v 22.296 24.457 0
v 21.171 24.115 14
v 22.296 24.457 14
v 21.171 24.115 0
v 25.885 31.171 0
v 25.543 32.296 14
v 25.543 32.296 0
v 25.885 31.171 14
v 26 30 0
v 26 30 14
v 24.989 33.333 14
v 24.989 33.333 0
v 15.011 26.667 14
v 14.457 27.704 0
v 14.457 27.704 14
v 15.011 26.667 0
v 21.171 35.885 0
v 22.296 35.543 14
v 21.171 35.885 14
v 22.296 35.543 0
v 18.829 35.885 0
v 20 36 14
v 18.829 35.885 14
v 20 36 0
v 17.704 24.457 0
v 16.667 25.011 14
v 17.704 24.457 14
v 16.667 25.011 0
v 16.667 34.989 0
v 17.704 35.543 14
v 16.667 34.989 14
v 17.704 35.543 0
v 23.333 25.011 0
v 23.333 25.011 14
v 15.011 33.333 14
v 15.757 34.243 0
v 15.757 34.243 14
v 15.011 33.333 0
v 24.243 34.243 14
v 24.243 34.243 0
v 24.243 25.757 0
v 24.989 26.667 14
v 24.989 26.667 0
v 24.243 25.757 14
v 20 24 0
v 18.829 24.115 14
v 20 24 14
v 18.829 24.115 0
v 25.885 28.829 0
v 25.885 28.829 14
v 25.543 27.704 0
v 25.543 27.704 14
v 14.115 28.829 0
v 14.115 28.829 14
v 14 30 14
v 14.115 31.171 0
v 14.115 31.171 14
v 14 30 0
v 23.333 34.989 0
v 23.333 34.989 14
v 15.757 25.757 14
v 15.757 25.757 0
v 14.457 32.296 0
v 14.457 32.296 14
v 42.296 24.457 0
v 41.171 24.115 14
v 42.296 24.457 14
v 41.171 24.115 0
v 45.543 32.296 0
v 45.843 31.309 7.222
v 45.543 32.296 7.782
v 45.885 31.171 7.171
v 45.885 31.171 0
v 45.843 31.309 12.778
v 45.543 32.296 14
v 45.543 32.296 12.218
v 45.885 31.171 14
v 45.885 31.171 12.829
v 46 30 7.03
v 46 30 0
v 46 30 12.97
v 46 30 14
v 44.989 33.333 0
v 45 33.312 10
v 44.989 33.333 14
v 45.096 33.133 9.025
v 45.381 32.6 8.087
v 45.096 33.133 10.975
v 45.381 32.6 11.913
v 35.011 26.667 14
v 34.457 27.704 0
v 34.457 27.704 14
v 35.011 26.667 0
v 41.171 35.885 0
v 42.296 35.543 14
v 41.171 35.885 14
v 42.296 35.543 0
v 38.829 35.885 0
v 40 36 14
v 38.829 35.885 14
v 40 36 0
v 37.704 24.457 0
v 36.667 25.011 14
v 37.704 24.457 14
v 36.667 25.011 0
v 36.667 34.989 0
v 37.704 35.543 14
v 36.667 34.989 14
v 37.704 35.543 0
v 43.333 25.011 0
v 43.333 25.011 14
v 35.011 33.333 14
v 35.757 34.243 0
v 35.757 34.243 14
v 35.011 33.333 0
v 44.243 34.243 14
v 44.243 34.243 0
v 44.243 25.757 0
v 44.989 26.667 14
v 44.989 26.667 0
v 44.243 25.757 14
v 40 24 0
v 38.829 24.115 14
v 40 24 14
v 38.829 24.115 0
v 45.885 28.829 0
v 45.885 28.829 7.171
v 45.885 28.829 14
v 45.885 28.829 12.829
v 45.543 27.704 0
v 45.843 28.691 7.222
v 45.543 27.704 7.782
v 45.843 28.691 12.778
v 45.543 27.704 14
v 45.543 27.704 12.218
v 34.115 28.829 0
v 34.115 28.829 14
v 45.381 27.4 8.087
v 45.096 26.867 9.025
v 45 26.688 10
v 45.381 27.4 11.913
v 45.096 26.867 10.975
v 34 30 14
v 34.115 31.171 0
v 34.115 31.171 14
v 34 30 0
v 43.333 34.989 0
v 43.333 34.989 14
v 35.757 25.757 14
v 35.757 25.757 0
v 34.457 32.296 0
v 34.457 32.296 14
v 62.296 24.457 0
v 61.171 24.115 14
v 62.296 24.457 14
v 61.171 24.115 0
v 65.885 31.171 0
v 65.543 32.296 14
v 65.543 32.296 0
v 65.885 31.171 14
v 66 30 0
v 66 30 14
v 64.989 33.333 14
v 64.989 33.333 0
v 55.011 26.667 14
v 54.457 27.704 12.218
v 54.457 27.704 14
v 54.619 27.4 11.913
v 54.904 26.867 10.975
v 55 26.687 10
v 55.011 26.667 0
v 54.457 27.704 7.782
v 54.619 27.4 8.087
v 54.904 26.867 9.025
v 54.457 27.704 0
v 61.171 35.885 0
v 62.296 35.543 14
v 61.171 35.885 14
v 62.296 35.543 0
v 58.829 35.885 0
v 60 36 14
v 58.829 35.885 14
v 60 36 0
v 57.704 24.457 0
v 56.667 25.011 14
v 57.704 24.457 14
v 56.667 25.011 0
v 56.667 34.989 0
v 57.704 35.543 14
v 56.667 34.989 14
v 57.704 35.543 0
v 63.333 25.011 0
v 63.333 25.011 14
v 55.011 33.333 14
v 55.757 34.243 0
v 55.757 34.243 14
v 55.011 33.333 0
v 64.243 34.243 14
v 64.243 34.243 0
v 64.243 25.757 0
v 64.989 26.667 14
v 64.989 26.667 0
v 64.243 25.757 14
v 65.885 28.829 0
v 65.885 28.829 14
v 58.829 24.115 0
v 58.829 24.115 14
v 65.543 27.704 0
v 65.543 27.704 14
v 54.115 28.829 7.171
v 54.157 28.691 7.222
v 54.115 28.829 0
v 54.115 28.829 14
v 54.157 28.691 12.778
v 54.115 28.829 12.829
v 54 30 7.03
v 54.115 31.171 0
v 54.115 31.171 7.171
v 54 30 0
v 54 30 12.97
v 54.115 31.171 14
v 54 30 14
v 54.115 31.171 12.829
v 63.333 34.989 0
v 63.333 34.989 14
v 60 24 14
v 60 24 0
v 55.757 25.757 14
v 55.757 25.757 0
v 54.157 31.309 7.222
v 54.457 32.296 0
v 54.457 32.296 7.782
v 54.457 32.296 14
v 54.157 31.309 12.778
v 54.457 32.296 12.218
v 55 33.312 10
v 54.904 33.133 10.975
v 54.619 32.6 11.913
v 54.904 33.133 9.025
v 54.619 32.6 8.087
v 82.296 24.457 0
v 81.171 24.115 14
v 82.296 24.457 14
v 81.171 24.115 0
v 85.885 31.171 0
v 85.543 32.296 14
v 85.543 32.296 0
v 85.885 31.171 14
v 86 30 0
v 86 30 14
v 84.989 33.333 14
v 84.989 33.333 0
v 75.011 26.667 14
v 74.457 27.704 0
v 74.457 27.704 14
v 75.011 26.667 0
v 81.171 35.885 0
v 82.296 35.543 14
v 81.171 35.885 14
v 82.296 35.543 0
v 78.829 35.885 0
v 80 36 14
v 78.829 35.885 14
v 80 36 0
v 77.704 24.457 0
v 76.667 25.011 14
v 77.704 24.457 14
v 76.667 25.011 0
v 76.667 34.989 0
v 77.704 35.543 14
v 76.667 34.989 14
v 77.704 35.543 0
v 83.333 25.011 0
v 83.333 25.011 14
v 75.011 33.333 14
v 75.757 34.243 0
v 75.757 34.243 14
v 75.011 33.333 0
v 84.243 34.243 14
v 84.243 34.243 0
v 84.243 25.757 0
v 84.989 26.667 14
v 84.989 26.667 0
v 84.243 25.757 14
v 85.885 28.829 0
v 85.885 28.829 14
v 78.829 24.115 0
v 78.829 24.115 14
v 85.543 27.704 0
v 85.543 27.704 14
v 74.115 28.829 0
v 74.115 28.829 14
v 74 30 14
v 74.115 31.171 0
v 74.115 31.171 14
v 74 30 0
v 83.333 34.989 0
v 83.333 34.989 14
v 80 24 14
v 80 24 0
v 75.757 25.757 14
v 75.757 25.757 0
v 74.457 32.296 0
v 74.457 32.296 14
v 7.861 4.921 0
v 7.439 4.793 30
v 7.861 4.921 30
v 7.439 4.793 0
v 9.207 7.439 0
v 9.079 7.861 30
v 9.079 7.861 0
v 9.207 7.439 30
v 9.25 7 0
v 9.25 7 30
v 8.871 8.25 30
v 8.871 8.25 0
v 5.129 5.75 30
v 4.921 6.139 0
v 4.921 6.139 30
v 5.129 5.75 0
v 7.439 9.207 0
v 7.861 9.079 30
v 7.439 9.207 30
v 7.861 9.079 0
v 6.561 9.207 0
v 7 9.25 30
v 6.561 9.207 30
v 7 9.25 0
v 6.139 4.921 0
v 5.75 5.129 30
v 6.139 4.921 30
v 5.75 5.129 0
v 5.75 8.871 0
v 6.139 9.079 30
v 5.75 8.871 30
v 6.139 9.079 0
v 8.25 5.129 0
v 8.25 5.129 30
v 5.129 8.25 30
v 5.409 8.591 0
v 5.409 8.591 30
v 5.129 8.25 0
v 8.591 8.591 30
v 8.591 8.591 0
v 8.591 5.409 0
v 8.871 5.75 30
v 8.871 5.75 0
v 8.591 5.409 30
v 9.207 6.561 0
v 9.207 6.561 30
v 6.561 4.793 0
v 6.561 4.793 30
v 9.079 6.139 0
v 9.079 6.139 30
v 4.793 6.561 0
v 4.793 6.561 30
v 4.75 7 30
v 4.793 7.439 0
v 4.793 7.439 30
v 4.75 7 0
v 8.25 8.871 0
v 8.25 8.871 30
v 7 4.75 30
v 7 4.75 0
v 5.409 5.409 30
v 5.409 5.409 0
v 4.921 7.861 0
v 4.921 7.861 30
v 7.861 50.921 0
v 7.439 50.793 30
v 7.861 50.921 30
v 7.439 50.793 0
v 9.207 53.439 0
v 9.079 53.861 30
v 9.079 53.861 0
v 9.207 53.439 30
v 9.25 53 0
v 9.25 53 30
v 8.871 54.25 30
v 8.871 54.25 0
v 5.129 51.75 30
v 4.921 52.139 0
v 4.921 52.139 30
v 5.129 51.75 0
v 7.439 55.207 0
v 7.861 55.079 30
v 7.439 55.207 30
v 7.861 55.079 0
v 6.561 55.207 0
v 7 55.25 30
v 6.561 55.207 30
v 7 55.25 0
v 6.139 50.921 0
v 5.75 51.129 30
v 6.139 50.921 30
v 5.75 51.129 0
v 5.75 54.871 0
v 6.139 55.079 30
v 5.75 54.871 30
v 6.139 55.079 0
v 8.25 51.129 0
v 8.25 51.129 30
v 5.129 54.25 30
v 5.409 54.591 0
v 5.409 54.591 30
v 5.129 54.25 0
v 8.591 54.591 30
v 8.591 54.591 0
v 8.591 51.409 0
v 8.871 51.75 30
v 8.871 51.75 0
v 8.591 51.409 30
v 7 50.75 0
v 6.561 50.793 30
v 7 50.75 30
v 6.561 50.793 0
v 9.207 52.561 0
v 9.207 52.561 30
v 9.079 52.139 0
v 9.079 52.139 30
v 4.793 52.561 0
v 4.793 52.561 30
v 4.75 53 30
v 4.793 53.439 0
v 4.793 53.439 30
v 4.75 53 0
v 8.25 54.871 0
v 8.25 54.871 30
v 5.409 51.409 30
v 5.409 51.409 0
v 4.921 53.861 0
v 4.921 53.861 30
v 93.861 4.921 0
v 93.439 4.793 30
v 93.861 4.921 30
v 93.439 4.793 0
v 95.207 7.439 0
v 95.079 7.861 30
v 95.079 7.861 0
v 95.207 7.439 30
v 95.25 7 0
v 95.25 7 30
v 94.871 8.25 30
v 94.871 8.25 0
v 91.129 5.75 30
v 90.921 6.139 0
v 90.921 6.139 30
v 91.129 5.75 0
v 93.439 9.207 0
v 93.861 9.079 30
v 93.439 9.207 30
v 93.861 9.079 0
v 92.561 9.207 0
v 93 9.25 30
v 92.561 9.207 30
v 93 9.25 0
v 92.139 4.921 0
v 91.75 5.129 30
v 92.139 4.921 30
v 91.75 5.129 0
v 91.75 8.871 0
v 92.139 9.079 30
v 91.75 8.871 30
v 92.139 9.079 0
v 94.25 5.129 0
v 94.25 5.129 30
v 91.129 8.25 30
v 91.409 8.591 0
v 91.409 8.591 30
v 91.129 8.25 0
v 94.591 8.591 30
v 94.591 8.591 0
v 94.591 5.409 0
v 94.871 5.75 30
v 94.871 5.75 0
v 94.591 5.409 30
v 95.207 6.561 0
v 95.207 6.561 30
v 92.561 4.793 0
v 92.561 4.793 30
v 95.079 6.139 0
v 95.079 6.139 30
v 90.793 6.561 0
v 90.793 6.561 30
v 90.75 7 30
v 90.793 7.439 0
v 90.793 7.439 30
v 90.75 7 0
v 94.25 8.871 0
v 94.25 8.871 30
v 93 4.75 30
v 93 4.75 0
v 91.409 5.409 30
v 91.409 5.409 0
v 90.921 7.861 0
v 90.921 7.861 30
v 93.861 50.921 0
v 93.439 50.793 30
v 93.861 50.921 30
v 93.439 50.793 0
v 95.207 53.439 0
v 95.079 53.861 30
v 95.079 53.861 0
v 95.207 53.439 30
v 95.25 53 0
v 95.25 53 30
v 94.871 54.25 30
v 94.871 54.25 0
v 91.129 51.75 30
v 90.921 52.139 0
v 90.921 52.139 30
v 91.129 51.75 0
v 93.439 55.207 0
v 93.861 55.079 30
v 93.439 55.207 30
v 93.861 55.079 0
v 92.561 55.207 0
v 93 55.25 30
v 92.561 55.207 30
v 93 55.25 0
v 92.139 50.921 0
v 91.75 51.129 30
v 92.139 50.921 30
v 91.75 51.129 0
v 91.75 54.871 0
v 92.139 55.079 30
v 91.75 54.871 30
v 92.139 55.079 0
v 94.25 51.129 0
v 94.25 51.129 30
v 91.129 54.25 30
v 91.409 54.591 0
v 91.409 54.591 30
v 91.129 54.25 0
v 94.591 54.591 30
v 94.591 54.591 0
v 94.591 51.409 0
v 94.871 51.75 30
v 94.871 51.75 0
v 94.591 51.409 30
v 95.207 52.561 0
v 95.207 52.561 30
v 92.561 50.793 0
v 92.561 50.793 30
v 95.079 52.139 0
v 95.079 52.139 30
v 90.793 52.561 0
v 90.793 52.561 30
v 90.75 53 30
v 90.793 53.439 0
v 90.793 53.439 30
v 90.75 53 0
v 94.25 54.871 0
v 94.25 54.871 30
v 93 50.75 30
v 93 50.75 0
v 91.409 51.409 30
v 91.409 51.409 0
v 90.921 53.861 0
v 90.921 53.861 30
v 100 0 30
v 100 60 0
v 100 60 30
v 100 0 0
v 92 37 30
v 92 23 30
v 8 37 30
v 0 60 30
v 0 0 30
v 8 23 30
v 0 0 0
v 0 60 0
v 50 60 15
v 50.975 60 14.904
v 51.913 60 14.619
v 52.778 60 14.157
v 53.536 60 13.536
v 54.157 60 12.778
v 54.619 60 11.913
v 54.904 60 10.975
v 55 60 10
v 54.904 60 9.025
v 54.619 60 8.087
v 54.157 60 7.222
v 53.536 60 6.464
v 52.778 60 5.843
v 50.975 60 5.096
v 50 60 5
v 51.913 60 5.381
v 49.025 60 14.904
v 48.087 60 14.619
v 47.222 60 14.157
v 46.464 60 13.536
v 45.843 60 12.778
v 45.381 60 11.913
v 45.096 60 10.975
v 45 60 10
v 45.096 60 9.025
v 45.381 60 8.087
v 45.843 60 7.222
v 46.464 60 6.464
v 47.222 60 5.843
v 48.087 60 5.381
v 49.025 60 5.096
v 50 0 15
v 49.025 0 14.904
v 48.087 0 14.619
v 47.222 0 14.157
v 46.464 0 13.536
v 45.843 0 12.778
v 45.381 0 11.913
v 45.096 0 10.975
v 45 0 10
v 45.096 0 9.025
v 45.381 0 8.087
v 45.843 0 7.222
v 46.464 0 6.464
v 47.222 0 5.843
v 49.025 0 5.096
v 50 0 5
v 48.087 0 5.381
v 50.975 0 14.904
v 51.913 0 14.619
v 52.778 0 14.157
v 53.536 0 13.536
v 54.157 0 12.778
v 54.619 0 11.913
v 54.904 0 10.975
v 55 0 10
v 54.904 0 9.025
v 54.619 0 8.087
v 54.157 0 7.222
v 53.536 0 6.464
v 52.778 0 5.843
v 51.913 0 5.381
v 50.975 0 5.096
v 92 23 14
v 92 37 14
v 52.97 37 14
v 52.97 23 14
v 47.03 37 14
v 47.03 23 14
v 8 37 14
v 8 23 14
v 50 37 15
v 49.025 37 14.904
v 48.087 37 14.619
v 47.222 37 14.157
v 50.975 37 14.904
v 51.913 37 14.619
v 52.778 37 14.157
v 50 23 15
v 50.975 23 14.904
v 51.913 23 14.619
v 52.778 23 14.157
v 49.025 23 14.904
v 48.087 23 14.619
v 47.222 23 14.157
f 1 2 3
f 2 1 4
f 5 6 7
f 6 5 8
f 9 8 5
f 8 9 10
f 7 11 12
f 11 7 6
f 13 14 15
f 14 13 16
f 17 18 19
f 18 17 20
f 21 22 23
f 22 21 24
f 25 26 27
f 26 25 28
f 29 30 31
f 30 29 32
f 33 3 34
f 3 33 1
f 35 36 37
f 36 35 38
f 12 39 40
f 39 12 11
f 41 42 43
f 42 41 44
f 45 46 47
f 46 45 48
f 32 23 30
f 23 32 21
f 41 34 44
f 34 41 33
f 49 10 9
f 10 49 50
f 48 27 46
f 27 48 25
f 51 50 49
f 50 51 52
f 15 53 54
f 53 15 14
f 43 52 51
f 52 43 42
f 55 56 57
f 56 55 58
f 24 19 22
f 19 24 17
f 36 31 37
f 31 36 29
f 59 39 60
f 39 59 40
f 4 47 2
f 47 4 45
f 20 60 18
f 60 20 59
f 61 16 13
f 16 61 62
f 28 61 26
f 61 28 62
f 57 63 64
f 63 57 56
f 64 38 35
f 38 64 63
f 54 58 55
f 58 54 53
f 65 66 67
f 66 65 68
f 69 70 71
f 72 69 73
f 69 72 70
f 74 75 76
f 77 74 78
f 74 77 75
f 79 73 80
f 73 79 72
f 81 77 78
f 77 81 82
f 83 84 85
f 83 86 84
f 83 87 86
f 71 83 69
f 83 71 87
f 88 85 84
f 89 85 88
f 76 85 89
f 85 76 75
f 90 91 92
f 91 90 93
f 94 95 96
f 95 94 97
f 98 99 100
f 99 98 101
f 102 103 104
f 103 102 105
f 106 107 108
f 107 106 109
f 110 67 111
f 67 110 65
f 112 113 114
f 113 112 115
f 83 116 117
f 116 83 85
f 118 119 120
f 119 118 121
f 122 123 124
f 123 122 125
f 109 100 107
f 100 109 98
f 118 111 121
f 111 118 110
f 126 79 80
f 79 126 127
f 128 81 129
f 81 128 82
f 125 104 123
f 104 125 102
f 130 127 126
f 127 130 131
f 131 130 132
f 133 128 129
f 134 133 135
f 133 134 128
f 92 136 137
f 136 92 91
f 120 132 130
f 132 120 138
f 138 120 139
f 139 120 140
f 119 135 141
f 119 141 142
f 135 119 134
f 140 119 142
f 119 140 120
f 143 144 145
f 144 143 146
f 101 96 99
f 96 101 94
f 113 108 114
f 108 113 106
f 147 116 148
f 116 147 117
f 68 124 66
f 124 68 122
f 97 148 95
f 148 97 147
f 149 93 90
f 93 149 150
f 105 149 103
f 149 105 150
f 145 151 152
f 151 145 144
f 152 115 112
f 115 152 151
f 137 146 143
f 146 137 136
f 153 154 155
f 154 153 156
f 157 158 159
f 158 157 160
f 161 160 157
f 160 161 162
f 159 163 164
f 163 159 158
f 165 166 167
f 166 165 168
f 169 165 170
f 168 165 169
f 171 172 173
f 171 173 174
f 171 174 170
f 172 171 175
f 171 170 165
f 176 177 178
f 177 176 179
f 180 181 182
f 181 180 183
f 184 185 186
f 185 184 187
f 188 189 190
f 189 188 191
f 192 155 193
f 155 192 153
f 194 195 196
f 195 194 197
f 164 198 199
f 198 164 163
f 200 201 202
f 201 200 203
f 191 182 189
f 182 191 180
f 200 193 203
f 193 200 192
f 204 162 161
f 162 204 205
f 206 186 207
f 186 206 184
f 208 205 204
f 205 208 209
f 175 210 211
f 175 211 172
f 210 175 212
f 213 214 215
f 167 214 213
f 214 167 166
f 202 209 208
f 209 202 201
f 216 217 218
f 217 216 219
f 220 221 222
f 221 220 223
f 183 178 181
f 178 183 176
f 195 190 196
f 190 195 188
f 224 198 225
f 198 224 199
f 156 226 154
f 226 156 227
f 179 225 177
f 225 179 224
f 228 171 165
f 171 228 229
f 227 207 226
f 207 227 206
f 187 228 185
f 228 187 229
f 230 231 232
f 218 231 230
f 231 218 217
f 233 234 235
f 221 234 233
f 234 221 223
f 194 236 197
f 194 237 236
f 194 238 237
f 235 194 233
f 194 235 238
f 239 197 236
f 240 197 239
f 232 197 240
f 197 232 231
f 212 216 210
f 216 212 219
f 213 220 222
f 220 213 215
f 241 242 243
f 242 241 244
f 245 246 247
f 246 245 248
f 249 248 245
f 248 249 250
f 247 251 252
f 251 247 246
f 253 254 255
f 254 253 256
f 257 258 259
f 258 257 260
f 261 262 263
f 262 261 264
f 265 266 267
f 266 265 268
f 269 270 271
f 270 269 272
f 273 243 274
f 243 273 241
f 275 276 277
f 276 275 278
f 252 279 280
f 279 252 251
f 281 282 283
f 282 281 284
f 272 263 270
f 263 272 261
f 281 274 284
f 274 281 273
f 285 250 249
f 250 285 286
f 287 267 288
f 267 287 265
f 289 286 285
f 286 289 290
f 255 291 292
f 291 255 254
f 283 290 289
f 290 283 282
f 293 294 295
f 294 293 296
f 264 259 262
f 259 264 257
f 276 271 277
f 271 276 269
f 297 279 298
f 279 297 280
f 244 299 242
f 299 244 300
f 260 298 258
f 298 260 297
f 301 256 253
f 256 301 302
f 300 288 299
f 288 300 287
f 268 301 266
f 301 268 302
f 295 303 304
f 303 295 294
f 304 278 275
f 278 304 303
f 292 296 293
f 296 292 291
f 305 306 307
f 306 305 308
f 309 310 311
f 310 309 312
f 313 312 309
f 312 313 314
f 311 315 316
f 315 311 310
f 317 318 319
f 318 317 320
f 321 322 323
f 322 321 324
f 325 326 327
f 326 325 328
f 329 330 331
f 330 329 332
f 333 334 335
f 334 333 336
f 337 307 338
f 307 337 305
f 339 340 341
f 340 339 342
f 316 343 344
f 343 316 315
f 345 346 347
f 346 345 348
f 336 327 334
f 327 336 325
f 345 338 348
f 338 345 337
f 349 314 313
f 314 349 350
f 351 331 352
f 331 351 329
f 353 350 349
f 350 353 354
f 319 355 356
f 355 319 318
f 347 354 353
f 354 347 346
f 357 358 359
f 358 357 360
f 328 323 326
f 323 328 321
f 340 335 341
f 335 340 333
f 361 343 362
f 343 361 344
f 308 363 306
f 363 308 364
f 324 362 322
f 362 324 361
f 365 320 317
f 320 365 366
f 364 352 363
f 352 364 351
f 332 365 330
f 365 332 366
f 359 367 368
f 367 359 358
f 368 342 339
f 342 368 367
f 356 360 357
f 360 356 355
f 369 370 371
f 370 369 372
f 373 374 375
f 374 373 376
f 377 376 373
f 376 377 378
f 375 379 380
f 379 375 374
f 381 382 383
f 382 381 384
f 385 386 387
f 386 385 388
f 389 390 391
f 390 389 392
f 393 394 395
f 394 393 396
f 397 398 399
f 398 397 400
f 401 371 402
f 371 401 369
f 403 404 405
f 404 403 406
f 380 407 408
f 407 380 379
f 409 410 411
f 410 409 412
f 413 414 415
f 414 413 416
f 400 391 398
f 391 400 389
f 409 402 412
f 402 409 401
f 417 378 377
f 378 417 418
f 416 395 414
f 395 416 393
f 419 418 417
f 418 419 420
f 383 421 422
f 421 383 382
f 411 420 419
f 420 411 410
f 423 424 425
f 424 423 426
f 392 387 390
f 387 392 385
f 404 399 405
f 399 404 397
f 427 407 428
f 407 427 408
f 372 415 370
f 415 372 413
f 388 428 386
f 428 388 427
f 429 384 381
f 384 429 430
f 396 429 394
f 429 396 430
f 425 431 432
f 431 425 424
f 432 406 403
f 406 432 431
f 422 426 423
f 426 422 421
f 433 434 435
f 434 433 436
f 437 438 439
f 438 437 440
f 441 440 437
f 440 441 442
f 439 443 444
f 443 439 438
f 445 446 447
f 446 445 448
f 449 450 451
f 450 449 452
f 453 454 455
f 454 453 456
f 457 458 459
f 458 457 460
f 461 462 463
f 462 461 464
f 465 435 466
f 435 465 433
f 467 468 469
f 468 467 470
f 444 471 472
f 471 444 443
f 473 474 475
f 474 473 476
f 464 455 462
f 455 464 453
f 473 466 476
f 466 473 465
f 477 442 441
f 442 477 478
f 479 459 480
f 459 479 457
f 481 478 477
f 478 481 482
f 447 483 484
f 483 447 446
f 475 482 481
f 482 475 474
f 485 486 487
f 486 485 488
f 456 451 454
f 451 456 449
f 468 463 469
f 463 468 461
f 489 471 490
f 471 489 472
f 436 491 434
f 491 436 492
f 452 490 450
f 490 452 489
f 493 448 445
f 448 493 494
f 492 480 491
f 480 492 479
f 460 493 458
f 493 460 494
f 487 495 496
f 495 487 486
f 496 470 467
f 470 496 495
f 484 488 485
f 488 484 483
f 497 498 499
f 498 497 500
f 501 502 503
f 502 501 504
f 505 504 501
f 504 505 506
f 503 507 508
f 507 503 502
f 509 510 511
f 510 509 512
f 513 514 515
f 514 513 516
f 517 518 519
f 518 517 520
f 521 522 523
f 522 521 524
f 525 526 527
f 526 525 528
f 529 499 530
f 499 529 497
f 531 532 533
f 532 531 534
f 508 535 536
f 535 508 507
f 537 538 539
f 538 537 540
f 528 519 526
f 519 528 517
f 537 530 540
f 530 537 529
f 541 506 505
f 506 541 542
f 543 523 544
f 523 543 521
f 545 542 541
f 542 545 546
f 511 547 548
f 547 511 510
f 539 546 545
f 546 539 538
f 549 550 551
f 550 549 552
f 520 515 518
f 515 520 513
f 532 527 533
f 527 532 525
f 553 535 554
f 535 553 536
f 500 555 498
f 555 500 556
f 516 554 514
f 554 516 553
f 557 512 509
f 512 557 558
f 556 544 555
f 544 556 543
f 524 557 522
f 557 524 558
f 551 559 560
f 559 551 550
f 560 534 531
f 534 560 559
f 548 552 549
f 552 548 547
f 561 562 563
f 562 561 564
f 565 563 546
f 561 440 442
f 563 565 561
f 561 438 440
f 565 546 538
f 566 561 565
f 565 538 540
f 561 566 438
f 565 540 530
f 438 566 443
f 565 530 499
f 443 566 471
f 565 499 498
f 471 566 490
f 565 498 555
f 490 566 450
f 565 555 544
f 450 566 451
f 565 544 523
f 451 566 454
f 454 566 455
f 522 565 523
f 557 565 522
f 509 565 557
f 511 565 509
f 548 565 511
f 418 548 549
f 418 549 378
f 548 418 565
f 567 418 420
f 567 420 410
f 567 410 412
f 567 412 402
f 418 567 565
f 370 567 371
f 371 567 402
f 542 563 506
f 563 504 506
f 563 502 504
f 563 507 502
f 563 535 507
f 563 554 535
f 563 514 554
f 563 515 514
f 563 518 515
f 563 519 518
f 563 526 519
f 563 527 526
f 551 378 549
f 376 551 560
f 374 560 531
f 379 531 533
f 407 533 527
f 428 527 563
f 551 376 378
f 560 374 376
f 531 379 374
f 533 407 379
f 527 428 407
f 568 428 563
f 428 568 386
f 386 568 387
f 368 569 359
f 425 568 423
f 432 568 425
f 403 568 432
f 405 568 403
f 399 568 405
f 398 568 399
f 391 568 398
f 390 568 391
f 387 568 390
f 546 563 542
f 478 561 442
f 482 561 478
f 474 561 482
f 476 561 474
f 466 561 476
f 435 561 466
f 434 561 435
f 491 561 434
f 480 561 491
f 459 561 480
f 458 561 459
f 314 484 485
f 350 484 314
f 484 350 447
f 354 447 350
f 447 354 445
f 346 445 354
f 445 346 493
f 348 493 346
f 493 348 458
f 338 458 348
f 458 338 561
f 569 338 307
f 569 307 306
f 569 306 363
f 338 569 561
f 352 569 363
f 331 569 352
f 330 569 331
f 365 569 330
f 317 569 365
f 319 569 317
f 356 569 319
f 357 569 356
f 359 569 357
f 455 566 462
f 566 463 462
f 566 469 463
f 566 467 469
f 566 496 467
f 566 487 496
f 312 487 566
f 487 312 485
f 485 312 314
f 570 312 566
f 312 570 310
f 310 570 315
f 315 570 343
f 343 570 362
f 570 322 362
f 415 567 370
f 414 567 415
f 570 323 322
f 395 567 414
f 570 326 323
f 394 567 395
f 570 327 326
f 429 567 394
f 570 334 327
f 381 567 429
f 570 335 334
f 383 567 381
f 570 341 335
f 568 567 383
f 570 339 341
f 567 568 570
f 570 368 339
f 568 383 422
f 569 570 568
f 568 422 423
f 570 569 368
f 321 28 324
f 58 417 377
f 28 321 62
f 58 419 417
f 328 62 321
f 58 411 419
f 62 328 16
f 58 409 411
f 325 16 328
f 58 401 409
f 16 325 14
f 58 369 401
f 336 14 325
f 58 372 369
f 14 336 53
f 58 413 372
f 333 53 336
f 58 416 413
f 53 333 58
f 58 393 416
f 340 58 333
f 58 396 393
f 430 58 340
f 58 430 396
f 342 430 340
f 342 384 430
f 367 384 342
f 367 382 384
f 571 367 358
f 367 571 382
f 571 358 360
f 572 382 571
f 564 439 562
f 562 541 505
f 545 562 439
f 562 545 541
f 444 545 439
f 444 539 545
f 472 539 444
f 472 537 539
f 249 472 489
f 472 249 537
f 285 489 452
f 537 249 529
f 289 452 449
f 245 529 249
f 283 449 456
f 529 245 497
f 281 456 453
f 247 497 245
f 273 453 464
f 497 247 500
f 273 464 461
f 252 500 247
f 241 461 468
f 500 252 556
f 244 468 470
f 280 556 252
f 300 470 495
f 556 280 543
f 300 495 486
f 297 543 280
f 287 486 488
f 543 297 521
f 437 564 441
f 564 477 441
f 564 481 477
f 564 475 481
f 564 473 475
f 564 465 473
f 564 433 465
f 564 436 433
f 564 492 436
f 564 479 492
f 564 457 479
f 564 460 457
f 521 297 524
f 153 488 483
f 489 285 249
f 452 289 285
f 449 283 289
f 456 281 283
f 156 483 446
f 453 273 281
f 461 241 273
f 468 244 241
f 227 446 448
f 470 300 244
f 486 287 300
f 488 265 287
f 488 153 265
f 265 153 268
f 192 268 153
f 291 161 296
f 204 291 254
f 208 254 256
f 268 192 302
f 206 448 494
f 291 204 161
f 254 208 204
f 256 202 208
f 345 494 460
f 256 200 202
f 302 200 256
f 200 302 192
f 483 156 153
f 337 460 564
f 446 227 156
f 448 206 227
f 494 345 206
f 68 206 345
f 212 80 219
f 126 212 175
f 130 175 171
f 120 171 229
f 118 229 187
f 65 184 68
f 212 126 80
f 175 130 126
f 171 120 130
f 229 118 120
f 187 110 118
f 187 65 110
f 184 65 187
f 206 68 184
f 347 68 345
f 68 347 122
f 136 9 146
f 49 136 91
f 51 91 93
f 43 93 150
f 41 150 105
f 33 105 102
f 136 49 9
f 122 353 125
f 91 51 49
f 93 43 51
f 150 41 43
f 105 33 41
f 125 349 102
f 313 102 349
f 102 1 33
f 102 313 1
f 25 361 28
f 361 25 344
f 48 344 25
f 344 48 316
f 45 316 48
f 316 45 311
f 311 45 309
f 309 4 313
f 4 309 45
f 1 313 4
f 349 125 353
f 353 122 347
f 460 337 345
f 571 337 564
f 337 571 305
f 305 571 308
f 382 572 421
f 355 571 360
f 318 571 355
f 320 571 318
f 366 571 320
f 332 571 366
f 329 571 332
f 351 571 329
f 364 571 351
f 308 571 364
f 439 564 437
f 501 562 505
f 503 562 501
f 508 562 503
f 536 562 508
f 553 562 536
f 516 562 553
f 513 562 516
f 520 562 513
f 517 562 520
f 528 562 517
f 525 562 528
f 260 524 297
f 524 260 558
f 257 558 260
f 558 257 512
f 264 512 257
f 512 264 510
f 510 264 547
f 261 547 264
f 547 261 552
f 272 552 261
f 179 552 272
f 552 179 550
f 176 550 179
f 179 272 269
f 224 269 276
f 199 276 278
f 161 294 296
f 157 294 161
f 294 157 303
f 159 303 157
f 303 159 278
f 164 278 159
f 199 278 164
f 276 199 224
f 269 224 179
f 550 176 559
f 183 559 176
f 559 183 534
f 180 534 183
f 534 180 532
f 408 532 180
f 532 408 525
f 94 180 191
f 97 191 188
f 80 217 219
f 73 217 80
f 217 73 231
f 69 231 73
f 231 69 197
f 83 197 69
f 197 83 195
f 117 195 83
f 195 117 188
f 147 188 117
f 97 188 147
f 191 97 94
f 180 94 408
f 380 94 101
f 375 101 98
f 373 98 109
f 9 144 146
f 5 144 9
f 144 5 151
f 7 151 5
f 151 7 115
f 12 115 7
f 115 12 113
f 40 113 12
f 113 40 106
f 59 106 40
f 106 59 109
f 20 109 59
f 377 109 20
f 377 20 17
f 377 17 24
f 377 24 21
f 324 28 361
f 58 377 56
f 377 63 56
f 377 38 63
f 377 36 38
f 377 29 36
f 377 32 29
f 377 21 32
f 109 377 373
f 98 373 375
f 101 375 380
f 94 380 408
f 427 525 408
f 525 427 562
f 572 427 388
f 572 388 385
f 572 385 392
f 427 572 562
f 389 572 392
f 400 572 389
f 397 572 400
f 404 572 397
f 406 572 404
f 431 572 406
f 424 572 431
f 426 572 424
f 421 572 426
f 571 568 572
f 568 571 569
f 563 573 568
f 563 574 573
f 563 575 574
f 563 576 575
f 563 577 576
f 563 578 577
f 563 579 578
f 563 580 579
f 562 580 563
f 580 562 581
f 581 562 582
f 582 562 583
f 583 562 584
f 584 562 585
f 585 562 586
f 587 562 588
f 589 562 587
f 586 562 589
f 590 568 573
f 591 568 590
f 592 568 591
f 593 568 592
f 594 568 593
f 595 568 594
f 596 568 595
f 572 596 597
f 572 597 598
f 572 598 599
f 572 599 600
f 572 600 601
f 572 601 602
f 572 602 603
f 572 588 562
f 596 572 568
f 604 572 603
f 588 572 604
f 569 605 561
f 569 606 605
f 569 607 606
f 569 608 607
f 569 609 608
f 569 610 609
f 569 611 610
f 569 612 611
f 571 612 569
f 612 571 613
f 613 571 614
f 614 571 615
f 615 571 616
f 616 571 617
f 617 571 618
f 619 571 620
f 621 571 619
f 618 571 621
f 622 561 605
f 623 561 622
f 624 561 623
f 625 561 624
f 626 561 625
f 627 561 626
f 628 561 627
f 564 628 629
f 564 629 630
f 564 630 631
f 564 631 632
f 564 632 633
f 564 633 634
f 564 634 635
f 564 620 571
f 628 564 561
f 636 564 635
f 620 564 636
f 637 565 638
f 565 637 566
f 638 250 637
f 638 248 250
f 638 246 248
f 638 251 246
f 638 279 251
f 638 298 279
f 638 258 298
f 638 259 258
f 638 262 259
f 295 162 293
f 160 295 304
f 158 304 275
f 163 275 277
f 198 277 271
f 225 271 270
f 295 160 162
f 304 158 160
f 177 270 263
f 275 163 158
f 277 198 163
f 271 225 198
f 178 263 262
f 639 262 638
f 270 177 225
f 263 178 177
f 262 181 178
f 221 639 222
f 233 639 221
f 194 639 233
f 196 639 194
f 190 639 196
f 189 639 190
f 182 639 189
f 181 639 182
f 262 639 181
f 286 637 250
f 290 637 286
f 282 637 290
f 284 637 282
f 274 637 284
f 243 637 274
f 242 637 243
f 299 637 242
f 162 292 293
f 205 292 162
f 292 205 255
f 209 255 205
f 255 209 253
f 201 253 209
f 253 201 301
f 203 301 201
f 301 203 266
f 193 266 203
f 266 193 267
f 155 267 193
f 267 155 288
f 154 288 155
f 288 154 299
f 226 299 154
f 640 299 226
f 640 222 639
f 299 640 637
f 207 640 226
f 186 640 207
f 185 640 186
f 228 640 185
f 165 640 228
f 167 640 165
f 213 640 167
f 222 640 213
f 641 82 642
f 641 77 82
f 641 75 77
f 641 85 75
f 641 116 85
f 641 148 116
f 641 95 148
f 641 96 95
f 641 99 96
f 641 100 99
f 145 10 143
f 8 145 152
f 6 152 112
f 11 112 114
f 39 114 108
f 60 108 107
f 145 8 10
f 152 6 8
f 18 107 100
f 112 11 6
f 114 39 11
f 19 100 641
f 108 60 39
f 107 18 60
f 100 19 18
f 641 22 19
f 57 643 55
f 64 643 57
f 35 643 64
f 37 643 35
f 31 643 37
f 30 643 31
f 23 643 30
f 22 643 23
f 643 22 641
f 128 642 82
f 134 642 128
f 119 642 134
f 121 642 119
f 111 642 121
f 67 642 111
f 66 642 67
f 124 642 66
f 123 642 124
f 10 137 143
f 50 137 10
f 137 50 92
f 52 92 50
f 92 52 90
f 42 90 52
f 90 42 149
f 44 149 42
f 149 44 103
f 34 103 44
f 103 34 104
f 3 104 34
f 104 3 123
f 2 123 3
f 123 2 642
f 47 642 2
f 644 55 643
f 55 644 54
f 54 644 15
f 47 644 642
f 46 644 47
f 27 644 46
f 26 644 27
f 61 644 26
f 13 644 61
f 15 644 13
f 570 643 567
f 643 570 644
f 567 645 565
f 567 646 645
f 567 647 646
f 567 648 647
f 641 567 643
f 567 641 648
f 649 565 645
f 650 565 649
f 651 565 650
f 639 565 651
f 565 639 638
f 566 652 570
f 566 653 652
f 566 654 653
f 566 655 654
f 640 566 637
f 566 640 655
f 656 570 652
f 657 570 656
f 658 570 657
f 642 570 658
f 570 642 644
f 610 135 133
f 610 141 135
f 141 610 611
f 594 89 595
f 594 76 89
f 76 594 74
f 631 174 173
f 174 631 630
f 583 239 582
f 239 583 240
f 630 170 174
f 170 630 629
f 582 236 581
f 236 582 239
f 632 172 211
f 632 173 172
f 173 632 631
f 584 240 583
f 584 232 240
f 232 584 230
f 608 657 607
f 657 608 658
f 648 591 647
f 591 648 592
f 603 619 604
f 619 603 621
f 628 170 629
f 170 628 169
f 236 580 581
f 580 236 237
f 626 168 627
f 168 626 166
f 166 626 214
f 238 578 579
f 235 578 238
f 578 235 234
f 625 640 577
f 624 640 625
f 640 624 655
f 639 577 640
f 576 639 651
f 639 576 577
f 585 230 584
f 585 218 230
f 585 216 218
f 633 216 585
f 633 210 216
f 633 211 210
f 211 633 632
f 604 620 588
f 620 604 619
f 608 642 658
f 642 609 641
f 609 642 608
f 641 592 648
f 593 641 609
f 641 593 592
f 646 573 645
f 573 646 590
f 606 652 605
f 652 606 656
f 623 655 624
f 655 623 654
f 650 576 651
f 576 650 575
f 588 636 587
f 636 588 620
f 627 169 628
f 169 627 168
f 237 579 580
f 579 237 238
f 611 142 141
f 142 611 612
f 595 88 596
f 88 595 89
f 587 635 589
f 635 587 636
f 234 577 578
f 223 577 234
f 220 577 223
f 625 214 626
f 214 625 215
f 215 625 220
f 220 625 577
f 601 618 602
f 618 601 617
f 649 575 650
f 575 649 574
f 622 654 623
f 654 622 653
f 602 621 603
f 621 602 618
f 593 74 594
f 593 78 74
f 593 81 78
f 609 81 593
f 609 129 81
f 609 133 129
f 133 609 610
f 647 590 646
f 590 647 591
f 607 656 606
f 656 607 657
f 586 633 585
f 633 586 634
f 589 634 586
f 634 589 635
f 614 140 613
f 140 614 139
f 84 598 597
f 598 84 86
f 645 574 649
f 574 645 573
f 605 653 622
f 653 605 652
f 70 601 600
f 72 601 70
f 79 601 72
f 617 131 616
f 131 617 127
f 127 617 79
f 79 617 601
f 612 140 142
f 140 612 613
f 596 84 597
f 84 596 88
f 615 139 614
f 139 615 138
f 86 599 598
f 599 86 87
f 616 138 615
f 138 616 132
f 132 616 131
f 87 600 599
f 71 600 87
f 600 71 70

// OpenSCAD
$fn = 32;

// ----------------------------------------------------------------------
// Manifold block: side_outlet manifold
// ----------------------------------------------------------------------

// --- parameters (mm) ---
block_l = 100;            // block length, X
block_w = 60;             // block width, Y
block_h = 30;             // block height, Z
port_d = 12;              // port bore diameter
port_pitch = 20;          // port pitch along X
gallery_d = 14;           // top gallery width, Y
gallery_depth = 16;       // gallery pocket depth
wall_p = 8;               // gallery end wall thickness, X
mnt_d = 4.5;              // mounting hole diameter
mnt_in = 7;               // mounting hole inset from the edges
out_d = 10;               // outlet bore diameter
out_z = 10;               // outlet axis height

n_ports = 4;  // ports in the row
port_x0 = (block_l - (n_ports - 1) * port_pitch) / 2;  // first port X

difference() {
  cube([block_l, block_w, block_h]);
  for (i = [0 : n_ports - 1])
    translate([port_x0 + i * port_pitch, block_w / 2, -1])
      cylinder(h = block_h + 2, d = port_d);
  translate([wall_p, block_w / 2 - gallery_d / 2, block_h - gallery_depth])
    cube([block_l - 2 * wall_p, gallery_d, gallery_depth + 1]);
  for (cx = [mnt_in, block_l - mnt_in])
    for (cy = [mnt_in, block_w - mnt_in])
      translate([cx, cy, -1]) cylinder(h = block_h + 2, d = mnt_d);
  translate([block_l / 2, -1, out_z]) rotate([-90, 0, 0])
    cylinder(h = block_w + 2, d = out_d);
}
